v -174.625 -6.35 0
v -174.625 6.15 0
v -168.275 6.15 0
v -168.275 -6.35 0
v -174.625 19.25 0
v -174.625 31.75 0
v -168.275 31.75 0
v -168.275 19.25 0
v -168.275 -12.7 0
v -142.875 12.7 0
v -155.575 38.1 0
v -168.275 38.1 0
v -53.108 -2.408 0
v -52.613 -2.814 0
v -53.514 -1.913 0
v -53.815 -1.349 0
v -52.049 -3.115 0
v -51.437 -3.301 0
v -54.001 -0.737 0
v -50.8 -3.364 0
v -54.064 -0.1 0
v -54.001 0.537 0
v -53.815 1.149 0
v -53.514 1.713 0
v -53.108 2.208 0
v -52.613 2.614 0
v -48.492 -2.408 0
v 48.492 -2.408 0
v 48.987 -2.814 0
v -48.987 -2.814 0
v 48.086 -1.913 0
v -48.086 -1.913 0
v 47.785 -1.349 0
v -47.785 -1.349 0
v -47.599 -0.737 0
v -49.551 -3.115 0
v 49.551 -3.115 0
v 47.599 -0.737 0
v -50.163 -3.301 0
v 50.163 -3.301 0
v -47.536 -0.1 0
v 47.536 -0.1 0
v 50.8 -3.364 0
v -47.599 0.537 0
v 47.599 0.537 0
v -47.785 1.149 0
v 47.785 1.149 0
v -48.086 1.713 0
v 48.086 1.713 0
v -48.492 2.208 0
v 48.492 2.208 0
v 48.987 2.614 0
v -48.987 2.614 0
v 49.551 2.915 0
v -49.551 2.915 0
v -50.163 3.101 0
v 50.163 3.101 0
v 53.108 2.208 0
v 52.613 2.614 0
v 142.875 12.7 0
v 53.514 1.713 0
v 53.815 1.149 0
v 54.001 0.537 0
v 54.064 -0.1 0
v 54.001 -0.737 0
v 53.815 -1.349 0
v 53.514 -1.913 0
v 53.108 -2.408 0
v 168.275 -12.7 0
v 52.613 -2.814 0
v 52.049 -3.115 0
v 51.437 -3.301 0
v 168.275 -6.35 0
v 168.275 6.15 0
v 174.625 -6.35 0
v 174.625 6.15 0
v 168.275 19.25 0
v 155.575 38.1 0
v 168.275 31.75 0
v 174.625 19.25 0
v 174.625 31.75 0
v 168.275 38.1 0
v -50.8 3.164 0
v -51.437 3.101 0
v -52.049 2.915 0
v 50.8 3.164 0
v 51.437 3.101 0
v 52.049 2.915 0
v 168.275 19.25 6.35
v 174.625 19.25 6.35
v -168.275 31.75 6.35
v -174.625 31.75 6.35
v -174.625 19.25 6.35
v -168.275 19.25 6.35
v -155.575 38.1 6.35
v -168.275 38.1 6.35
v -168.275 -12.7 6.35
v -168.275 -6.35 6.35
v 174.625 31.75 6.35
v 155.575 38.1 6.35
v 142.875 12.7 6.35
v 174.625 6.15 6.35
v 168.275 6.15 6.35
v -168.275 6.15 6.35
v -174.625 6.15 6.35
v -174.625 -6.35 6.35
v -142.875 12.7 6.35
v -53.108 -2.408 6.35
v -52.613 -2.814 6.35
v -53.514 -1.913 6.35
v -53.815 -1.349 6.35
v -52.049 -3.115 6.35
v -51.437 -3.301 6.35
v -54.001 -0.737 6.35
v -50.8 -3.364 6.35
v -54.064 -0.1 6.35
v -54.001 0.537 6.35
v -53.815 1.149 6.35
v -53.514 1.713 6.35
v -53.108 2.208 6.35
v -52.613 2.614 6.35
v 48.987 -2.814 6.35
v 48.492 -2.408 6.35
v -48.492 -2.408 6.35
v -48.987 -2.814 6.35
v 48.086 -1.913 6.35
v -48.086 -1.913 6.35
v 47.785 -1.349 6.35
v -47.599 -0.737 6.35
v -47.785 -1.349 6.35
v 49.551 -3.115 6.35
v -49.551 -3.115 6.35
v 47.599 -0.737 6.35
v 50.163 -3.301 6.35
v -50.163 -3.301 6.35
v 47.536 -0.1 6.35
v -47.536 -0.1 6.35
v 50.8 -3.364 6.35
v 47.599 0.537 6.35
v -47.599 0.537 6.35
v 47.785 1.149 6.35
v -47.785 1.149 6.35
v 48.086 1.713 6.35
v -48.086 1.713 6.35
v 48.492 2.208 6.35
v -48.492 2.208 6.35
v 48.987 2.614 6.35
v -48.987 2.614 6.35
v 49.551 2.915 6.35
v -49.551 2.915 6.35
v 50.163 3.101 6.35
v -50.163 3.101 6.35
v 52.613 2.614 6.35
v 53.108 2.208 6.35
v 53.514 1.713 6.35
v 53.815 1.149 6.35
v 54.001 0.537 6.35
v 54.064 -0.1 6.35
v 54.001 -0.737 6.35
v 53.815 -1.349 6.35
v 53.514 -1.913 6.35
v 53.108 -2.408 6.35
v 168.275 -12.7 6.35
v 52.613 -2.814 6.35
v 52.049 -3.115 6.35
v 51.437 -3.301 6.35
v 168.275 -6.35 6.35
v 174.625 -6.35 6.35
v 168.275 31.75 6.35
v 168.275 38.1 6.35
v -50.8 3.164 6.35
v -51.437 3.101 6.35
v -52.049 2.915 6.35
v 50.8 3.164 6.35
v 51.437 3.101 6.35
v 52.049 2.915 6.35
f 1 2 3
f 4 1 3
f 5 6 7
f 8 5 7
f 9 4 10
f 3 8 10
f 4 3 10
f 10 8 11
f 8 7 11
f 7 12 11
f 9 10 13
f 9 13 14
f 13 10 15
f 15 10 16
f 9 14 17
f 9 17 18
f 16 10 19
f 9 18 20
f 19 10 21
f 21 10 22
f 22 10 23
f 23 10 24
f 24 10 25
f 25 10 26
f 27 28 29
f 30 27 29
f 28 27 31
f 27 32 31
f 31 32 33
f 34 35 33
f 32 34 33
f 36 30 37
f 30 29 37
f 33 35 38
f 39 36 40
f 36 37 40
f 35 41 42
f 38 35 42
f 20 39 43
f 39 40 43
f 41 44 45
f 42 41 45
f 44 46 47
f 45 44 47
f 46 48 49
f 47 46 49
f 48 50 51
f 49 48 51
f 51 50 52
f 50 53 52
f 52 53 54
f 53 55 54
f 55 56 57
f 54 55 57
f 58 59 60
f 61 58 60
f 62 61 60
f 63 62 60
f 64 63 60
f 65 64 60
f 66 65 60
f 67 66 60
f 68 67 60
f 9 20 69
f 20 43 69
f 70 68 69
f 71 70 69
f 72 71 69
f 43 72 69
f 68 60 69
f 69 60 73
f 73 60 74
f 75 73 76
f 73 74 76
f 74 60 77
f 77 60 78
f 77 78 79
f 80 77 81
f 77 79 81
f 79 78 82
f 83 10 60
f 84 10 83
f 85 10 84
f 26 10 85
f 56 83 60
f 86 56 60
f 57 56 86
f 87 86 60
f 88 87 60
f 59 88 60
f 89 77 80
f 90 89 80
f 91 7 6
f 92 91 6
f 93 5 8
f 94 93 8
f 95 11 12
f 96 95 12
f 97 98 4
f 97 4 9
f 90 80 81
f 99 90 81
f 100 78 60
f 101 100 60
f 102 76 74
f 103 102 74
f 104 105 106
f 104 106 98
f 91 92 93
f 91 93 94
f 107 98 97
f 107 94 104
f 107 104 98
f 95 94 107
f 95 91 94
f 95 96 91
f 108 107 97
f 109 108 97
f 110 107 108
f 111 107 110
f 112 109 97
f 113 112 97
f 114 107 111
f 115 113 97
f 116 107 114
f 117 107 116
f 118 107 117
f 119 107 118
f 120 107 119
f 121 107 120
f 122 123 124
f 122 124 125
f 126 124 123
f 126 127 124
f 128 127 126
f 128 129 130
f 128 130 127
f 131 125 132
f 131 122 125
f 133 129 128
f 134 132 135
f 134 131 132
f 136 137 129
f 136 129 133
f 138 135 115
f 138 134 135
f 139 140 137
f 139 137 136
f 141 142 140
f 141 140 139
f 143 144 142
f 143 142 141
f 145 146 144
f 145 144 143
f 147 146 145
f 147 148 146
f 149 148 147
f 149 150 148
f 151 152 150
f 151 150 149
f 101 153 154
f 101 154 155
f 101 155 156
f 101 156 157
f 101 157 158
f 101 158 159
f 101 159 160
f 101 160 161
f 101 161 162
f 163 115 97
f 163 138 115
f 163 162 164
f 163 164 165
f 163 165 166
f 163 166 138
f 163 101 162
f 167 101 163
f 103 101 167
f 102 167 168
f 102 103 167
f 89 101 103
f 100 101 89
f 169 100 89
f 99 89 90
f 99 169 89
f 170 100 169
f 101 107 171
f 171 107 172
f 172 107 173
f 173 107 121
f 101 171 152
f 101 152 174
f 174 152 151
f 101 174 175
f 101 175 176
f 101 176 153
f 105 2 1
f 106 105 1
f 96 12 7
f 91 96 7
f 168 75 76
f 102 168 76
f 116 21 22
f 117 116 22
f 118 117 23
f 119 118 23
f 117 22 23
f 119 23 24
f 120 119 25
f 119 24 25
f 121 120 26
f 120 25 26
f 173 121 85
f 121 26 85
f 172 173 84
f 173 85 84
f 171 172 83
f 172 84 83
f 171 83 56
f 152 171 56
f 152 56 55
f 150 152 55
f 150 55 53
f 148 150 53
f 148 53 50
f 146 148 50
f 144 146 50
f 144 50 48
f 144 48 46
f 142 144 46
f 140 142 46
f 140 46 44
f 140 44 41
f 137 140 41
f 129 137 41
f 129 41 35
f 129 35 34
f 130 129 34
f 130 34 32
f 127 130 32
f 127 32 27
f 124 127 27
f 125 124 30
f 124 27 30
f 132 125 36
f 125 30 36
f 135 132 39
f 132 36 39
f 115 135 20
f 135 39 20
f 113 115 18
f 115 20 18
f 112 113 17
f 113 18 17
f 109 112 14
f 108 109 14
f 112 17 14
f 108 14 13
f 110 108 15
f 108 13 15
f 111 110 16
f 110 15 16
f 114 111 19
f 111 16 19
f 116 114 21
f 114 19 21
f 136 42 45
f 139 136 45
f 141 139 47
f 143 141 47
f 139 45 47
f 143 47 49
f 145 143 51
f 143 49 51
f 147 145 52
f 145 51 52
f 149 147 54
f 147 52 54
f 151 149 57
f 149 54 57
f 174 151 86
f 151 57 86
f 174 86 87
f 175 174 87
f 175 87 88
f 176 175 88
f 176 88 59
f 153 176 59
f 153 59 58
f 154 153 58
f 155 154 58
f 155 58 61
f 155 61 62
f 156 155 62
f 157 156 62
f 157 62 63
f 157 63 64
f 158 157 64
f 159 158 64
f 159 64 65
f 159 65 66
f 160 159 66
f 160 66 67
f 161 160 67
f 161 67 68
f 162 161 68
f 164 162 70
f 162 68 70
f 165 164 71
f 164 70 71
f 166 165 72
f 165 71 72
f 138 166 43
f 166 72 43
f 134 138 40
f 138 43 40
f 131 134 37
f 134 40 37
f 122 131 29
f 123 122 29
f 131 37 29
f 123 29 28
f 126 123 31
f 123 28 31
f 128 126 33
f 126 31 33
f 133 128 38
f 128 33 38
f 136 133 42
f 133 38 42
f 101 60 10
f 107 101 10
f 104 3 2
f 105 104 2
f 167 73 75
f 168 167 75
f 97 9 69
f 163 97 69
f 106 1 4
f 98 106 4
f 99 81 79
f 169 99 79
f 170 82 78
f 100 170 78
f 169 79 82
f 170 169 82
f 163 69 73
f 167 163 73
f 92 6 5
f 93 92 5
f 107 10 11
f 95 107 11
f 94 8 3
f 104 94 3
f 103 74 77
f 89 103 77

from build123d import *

# Parameters (mm, degrees)
BOSS_EXTRUDE1_DEPTH      = 6.35
F_0_257_DIAMETER_HOLE1_D = 6.5278


with BuildPart() as part:
    # Sketch1 → Boss-Extrude1 (new body)
    with BuildSketch(Plane.XY):
        Polygon((-168.275, -6.35), (-168.275, -12.7), (-142.875, -12.7), (-9.525, -12.7), (9.525, -12.7), (142.875, -12.7), (168.275, -12.7), (168.275, -6.35), (174.625, -6.35), (174.625, 6.15), (168.275, 6.15), (168.275, 12.7), (168.275, 19.25), (174.625, 19.25), (174.625, 31.75), (168.275, 31.75), (168.275, 38.1), (155.575, 38.1), (142.875, 12.7), (9.525, 12.7), (-9.525, 12.7), (-142.875, 12.7), (-155.575, 38.1), (-168.275, 38.1), (-168.275, 31.75), (-174.625, 31.75), (-174.625, 19.25), (-168.275, 19.25), (-168.275, 12.7), (-168.275, 6.15), (-174.625, 6.15), (-174.625, -6.35), align=None)
    extrude(amount=BOSS_EXTRUDE1_DEPTH)

    # F (0.257) Diameter Hole1 (through all)
    with Locations(Plane.XY.offset(6.35)):
        with Locations((-50.8, -0.1), (50.8, -0.1)):
            Hole(F_0_257_DIAMETER_HOLE1_D / 2)


solid = part.part
